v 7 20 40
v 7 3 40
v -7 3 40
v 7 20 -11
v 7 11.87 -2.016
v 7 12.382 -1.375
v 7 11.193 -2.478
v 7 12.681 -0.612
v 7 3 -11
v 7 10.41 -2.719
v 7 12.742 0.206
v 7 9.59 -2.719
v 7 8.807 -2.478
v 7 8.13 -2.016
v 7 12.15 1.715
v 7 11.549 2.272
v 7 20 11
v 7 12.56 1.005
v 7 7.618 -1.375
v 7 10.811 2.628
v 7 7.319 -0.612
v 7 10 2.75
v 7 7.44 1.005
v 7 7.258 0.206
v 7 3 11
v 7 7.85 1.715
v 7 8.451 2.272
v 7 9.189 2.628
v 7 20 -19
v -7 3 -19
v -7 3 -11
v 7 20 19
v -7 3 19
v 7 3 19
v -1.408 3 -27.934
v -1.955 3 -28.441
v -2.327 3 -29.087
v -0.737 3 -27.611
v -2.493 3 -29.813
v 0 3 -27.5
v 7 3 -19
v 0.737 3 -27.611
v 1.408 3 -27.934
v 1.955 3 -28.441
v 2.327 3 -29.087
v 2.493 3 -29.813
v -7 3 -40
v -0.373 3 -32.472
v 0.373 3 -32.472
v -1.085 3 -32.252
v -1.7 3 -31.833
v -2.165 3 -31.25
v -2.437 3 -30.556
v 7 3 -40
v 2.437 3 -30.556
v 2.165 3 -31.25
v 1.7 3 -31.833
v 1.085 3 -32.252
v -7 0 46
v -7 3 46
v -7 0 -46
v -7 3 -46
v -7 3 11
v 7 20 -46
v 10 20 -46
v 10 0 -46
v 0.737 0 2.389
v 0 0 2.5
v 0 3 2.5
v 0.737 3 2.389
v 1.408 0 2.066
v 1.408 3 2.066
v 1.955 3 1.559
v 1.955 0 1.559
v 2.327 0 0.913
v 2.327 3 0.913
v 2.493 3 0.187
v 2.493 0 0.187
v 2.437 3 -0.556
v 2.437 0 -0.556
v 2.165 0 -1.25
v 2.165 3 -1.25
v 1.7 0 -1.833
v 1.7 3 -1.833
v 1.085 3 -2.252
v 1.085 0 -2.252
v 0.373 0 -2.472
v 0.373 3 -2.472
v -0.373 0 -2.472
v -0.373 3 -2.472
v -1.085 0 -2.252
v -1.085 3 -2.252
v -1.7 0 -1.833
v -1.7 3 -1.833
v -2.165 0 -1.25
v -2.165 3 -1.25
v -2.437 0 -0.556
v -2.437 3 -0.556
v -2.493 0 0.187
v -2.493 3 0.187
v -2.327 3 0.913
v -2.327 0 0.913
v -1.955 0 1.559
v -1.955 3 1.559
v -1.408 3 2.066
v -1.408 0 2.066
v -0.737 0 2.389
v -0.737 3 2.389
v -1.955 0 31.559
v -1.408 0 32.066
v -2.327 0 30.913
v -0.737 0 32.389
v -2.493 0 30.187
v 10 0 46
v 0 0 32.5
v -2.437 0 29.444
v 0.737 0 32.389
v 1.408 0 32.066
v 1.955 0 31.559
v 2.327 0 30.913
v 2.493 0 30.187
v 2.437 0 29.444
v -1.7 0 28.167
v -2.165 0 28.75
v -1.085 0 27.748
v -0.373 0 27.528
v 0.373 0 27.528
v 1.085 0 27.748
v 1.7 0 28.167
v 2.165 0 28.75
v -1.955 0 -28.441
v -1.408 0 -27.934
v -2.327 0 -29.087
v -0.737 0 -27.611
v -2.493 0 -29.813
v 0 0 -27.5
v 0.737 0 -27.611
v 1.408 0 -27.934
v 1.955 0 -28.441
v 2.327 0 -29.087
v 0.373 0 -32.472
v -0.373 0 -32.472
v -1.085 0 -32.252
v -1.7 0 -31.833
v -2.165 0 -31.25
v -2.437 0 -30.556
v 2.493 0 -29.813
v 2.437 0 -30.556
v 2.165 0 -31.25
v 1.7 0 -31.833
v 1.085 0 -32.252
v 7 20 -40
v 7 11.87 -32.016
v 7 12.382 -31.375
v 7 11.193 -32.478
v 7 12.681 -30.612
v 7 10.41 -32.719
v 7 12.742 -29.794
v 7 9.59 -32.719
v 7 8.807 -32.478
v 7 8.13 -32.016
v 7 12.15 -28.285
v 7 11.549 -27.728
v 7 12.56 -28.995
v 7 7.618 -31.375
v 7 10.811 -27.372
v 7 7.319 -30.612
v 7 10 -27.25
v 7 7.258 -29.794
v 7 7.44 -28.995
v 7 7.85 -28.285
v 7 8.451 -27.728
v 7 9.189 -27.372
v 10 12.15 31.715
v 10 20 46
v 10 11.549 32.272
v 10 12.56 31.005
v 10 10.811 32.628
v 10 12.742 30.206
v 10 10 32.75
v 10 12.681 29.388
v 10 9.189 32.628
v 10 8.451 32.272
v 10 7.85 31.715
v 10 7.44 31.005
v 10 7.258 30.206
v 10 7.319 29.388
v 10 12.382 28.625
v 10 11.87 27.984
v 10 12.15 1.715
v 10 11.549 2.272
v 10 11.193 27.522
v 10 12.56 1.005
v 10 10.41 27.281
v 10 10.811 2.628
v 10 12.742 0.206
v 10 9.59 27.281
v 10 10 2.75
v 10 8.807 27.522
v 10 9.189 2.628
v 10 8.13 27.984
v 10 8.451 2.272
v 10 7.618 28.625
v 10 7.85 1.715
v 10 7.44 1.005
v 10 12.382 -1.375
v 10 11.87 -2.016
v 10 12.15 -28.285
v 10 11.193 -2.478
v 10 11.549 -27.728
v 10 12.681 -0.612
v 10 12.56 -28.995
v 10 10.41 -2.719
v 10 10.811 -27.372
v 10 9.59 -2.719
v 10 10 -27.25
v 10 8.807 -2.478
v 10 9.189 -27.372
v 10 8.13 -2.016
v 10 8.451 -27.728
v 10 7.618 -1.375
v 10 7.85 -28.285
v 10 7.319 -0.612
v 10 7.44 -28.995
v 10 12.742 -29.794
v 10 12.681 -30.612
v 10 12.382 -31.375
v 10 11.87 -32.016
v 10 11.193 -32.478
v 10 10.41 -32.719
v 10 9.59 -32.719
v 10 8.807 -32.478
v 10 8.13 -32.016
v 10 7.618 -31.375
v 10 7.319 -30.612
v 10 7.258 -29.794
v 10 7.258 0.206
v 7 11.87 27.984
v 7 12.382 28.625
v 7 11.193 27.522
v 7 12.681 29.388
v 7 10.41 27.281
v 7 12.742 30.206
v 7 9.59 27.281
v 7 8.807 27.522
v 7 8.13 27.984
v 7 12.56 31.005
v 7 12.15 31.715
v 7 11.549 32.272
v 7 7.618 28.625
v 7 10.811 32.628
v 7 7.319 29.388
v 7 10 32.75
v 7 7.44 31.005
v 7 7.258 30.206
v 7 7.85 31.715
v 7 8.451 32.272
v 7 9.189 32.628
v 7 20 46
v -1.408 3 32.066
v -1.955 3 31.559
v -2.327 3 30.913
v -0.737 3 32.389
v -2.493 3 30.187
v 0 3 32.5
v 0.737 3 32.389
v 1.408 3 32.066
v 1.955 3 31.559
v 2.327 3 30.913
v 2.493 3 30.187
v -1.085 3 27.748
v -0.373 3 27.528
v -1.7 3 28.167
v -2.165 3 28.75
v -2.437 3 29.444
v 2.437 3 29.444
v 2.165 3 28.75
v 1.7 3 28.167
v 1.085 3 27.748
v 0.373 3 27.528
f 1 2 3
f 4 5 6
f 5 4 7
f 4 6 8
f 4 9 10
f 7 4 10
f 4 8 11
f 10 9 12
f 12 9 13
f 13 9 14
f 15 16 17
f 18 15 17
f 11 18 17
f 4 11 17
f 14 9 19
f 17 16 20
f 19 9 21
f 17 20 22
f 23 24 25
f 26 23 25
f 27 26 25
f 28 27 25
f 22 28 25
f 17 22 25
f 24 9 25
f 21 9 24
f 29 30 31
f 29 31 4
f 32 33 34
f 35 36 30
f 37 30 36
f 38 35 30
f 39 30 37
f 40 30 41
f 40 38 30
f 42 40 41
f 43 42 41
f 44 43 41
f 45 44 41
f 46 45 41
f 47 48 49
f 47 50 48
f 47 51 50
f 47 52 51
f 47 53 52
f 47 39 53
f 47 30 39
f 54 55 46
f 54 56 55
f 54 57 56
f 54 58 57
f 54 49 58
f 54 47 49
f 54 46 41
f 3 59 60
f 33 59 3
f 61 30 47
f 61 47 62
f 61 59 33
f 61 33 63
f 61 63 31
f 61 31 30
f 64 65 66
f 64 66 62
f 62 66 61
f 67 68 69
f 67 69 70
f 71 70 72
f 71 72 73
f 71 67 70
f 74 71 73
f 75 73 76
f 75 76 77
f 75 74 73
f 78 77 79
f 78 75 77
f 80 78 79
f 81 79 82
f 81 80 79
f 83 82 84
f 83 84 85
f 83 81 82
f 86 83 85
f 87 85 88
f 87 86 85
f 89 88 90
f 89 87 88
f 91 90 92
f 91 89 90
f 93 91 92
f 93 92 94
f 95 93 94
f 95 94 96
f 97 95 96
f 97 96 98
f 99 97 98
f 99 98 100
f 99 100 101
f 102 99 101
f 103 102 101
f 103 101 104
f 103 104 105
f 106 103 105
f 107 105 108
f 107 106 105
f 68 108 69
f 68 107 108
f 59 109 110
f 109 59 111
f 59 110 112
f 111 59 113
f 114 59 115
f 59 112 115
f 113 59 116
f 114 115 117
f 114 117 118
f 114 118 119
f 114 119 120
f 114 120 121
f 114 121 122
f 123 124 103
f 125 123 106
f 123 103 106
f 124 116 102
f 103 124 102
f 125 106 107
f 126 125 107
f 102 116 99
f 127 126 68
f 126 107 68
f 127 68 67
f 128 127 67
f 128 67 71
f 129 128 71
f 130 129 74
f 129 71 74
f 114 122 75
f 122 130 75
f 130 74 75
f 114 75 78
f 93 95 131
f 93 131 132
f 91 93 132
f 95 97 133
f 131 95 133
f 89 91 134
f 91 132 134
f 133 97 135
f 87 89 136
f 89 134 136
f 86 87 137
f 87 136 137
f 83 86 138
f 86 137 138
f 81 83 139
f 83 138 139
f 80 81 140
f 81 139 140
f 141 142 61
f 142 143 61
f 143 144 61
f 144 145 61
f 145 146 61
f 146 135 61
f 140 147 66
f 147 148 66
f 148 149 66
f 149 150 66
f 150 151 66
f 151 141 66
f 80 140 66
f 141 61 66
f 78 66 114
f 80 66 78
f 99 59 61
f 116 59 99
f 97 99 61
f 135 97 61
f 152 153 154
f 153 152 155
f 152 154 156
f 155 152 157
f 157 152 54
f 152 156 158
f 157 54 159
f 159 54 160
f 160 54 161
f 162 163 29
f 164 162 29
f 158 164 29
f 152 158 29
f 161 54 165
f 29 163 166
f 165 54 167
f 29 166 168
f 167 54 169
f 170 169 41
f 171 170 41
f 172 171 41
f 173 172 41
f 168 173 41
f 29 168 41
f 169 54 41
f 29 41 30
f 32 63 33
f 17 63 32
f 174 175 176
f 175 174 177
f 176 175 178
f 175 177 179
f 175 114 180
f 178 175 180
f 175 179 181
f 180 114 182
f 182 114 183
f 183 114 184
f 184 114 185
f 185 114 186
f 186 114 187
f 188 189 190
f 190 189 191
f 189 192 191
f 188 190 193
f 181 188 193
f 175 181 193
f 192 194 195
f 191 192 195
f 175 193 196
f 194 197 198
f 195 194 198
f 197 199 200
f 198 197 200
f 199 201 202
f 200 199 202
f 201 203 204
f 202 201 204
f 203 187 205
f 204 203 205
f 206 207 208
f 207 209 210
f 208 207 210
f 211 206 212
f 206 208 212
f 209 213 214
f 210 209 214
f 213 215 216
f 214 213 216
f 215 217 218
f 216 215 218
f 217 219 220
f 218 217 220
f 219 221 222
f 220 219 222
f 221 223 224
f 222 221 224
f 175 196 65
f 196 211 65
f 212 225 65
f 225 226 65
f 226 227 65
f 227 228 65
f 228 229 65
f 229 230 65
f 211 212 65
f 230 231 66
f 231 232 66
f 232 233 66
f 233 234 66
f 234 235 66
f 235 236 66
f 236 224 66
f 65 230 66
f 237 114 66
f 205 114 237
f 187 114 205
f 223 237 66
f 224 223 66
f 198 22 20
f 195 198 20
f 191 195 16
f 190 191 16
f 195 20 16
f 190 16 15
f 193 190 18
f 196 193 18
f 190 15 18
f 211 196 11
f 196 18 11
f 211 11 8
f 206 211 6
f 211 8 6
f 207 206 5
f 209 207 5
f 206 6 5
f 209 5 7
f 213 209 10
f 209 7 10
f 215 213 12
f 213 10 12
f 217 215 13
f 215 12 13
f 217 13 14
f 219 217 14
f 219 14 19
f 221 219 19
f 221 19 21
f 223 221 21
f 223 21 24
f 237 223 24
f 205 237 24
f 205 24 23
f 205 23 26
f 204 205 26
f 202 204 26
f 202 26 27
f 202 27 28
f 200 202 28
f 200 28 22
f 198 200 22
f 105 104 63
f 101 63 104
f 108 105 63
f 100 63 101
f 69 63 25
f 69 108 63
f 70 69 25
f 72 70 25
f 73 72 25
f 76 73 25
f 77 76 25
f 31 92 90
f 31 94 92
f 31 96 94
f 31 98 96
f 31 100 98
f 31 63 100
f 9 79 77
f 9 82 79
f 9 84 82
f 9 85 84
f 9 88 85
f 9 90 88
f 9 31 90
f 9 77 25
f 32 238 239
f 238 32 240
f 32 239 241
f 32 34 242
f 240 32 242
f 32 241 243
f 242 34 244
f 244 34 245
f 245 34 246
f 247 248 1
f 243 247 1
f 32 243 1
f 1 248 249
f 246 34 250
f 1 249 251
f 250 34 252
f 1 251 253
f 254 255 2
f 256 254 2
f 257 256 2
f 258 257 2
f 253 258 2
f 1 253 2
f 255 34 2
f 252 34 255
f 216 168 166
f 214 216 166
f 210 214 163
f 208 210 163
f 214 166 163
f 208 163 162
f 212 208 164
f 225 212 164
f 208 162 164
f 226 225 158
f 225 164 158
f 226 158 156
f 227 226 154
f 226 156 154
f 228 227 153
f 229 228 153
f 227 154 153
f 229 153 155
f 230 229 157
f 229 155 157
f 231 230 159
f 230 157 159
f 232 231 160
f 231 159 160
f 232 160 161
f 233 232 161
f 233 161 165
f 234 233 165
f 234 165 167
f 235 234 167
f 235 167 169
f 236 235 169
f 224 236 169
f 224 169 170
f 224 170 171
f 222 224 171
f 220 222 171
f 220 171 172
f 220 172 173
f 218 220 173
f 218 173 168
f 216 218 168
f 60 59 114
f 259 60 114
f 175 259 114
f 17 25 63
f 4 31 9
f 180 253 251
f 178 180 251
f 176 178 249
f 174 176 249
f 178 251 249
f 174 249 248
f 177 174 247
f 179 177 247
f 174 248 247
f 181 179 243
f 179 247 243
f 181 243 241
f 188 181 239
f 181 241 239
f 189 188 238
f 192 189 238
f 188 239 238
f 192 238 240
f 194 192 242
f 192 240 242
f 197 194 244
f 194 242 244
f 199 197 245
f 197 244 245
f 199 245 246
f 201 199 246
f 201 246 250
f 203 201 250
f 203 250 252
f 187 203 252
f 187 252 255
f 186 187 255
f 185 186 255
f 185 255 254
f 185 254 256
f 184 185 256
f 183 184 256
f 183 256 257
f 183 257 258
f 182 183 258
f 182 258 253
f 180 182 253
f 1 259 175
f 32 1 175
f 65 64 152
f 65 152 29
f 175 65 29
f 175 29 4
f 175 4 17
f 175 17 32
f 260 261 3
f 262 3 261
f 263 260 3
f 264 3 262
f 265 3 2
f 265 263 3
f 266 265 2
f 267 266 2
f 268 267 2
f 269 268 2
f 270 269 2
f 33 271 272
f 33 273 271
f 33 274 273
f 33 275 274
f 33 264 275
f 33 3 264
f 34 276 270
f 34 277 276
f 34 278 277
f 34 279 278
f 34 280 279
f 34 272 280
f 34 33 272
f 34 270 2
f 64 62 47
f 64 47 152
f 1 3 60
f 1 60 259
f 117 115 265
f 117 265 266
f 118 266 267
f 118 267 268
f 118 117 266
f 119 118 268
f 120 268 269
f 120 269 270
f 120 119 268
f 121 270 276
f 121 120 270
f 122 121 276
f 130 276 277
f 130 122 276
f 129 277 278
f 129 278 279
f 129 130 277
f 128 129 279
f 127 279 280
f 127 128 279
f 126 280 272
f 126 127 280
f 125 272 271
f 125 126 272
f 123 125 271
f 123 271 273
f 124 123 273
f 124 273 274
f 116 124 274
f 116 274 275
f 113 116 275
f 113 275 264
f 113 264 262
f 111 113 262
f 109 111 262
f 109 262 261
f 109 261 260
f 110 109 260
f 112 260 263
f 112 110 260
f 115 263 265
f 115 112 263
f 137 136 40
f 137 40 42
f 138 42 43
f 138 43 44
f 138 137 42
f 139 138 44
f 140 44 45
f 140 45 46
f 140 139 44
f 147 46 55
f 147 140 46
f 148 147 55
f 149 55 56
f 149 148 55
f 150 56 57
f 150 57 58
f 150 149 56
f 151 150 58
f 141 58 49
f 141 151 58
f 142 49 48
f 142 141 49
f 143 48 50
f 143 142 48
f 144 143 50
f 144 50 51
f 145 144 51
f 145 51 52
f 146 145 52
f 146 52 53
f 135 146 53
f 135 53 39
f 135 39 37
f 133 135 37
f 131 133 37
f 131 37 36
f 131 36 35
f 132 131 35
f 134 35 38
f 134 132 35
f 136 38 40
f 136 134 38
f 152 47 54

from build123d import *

# Parameters (mm, degrees)
SKETCH1_W               = 17
SKETCH1_H               = 92
SKETCH1_R               = 2.5
BOSS_EXTRUDE1_DEPTH     = 3
BOSS_EXTRUDE6_DEPTH     = 20
CUT_EXTRUDE2_DEPTH      = 95.678403028
CUT_EXTRUDE2_DEPTH_BACK = 95.678403028
SKETCH2_R               = 2.75
CUT_EXTRUDE1_DEPTH      = 5


with BuildPart() as part:
    # Sketch1 → Boss-Extrude1 (new body)
    with BuildSketch(Plane(origin=(0, 0, 0), x_dir=(1, 0, 0), z_dir=(0, 1, 0))):
        with Locations((1.5, 0)):
            Rectangle(SKETCH1_W, SKETCH1_H)
        with Locations((0, -30)):
            Circle(SKETCH1_R, mode=Mode.SUBTRACT)
        Circle(SKETCH1_R, mode=Mode.SUBTRACT)
        with Locations((0, 30)):
            Circle(SKETCH1_R, mode=Mode.SUBTRACT)
    extrude(amount=BOSS_EXTRUDE1_DEPTH)

    # Sketch1<3> → Boss-Extrude6 (add)
    with BuildSketch(Plane(origin=(0, 0, 0), x_dir=(1, 0, 0), z_dir=(0, 1, 0))):
        Polygon((-7, 46), (-7, 40), (7, 40), (7, 19), (-7, 19), (-7, 11), (7, 11), (7, -11), (-7, -11), (-7, -19), (7, -19), (7, -40), (-7, -40), (-7, -46), (7, -46), (10, -46), (10, -40), (10, -18), (10, -12), (10, 12), (10, 18), (10, 40), (10, 46), (7, 46), align=None)
    extrude(amount=BOSS_EXTRUDE6_DEPTH)

    # Sketch3 → Cut-Extrude2 (cut, two sides: drawn at the far end of the back side and taken through both)
    with BuildSketch(Plane.XY.offset(46).offset(-CUT_EXTRUDE2_DEPTH_BACK)):
        Polygon((-7, 20), (-7, 3), (7, 20), align=None)
    extrude(amount=CUT_EXTRUDE2_DEPTH + CUT_EXTRUDE2_DEPTH_BACK, mode=Mode.SUBTRACT)

    # Sketch2 → Cut-Extrude1 (cut)
    with BuildSketch(Plane.ZY.offset(-7)):
        with Locations((-30, 10)):
            Circle(SKETCH2_R)
        with Locations((0, 10)):
            Circle(SKETCH2_R)
        with Locations((30, 10)):
            Circle(SKETCH2_R)
    extrude(amount=-CUT_EXTRUDE1_DEPTH, mode=Mode.SUBTRACT)


solid = part.part
